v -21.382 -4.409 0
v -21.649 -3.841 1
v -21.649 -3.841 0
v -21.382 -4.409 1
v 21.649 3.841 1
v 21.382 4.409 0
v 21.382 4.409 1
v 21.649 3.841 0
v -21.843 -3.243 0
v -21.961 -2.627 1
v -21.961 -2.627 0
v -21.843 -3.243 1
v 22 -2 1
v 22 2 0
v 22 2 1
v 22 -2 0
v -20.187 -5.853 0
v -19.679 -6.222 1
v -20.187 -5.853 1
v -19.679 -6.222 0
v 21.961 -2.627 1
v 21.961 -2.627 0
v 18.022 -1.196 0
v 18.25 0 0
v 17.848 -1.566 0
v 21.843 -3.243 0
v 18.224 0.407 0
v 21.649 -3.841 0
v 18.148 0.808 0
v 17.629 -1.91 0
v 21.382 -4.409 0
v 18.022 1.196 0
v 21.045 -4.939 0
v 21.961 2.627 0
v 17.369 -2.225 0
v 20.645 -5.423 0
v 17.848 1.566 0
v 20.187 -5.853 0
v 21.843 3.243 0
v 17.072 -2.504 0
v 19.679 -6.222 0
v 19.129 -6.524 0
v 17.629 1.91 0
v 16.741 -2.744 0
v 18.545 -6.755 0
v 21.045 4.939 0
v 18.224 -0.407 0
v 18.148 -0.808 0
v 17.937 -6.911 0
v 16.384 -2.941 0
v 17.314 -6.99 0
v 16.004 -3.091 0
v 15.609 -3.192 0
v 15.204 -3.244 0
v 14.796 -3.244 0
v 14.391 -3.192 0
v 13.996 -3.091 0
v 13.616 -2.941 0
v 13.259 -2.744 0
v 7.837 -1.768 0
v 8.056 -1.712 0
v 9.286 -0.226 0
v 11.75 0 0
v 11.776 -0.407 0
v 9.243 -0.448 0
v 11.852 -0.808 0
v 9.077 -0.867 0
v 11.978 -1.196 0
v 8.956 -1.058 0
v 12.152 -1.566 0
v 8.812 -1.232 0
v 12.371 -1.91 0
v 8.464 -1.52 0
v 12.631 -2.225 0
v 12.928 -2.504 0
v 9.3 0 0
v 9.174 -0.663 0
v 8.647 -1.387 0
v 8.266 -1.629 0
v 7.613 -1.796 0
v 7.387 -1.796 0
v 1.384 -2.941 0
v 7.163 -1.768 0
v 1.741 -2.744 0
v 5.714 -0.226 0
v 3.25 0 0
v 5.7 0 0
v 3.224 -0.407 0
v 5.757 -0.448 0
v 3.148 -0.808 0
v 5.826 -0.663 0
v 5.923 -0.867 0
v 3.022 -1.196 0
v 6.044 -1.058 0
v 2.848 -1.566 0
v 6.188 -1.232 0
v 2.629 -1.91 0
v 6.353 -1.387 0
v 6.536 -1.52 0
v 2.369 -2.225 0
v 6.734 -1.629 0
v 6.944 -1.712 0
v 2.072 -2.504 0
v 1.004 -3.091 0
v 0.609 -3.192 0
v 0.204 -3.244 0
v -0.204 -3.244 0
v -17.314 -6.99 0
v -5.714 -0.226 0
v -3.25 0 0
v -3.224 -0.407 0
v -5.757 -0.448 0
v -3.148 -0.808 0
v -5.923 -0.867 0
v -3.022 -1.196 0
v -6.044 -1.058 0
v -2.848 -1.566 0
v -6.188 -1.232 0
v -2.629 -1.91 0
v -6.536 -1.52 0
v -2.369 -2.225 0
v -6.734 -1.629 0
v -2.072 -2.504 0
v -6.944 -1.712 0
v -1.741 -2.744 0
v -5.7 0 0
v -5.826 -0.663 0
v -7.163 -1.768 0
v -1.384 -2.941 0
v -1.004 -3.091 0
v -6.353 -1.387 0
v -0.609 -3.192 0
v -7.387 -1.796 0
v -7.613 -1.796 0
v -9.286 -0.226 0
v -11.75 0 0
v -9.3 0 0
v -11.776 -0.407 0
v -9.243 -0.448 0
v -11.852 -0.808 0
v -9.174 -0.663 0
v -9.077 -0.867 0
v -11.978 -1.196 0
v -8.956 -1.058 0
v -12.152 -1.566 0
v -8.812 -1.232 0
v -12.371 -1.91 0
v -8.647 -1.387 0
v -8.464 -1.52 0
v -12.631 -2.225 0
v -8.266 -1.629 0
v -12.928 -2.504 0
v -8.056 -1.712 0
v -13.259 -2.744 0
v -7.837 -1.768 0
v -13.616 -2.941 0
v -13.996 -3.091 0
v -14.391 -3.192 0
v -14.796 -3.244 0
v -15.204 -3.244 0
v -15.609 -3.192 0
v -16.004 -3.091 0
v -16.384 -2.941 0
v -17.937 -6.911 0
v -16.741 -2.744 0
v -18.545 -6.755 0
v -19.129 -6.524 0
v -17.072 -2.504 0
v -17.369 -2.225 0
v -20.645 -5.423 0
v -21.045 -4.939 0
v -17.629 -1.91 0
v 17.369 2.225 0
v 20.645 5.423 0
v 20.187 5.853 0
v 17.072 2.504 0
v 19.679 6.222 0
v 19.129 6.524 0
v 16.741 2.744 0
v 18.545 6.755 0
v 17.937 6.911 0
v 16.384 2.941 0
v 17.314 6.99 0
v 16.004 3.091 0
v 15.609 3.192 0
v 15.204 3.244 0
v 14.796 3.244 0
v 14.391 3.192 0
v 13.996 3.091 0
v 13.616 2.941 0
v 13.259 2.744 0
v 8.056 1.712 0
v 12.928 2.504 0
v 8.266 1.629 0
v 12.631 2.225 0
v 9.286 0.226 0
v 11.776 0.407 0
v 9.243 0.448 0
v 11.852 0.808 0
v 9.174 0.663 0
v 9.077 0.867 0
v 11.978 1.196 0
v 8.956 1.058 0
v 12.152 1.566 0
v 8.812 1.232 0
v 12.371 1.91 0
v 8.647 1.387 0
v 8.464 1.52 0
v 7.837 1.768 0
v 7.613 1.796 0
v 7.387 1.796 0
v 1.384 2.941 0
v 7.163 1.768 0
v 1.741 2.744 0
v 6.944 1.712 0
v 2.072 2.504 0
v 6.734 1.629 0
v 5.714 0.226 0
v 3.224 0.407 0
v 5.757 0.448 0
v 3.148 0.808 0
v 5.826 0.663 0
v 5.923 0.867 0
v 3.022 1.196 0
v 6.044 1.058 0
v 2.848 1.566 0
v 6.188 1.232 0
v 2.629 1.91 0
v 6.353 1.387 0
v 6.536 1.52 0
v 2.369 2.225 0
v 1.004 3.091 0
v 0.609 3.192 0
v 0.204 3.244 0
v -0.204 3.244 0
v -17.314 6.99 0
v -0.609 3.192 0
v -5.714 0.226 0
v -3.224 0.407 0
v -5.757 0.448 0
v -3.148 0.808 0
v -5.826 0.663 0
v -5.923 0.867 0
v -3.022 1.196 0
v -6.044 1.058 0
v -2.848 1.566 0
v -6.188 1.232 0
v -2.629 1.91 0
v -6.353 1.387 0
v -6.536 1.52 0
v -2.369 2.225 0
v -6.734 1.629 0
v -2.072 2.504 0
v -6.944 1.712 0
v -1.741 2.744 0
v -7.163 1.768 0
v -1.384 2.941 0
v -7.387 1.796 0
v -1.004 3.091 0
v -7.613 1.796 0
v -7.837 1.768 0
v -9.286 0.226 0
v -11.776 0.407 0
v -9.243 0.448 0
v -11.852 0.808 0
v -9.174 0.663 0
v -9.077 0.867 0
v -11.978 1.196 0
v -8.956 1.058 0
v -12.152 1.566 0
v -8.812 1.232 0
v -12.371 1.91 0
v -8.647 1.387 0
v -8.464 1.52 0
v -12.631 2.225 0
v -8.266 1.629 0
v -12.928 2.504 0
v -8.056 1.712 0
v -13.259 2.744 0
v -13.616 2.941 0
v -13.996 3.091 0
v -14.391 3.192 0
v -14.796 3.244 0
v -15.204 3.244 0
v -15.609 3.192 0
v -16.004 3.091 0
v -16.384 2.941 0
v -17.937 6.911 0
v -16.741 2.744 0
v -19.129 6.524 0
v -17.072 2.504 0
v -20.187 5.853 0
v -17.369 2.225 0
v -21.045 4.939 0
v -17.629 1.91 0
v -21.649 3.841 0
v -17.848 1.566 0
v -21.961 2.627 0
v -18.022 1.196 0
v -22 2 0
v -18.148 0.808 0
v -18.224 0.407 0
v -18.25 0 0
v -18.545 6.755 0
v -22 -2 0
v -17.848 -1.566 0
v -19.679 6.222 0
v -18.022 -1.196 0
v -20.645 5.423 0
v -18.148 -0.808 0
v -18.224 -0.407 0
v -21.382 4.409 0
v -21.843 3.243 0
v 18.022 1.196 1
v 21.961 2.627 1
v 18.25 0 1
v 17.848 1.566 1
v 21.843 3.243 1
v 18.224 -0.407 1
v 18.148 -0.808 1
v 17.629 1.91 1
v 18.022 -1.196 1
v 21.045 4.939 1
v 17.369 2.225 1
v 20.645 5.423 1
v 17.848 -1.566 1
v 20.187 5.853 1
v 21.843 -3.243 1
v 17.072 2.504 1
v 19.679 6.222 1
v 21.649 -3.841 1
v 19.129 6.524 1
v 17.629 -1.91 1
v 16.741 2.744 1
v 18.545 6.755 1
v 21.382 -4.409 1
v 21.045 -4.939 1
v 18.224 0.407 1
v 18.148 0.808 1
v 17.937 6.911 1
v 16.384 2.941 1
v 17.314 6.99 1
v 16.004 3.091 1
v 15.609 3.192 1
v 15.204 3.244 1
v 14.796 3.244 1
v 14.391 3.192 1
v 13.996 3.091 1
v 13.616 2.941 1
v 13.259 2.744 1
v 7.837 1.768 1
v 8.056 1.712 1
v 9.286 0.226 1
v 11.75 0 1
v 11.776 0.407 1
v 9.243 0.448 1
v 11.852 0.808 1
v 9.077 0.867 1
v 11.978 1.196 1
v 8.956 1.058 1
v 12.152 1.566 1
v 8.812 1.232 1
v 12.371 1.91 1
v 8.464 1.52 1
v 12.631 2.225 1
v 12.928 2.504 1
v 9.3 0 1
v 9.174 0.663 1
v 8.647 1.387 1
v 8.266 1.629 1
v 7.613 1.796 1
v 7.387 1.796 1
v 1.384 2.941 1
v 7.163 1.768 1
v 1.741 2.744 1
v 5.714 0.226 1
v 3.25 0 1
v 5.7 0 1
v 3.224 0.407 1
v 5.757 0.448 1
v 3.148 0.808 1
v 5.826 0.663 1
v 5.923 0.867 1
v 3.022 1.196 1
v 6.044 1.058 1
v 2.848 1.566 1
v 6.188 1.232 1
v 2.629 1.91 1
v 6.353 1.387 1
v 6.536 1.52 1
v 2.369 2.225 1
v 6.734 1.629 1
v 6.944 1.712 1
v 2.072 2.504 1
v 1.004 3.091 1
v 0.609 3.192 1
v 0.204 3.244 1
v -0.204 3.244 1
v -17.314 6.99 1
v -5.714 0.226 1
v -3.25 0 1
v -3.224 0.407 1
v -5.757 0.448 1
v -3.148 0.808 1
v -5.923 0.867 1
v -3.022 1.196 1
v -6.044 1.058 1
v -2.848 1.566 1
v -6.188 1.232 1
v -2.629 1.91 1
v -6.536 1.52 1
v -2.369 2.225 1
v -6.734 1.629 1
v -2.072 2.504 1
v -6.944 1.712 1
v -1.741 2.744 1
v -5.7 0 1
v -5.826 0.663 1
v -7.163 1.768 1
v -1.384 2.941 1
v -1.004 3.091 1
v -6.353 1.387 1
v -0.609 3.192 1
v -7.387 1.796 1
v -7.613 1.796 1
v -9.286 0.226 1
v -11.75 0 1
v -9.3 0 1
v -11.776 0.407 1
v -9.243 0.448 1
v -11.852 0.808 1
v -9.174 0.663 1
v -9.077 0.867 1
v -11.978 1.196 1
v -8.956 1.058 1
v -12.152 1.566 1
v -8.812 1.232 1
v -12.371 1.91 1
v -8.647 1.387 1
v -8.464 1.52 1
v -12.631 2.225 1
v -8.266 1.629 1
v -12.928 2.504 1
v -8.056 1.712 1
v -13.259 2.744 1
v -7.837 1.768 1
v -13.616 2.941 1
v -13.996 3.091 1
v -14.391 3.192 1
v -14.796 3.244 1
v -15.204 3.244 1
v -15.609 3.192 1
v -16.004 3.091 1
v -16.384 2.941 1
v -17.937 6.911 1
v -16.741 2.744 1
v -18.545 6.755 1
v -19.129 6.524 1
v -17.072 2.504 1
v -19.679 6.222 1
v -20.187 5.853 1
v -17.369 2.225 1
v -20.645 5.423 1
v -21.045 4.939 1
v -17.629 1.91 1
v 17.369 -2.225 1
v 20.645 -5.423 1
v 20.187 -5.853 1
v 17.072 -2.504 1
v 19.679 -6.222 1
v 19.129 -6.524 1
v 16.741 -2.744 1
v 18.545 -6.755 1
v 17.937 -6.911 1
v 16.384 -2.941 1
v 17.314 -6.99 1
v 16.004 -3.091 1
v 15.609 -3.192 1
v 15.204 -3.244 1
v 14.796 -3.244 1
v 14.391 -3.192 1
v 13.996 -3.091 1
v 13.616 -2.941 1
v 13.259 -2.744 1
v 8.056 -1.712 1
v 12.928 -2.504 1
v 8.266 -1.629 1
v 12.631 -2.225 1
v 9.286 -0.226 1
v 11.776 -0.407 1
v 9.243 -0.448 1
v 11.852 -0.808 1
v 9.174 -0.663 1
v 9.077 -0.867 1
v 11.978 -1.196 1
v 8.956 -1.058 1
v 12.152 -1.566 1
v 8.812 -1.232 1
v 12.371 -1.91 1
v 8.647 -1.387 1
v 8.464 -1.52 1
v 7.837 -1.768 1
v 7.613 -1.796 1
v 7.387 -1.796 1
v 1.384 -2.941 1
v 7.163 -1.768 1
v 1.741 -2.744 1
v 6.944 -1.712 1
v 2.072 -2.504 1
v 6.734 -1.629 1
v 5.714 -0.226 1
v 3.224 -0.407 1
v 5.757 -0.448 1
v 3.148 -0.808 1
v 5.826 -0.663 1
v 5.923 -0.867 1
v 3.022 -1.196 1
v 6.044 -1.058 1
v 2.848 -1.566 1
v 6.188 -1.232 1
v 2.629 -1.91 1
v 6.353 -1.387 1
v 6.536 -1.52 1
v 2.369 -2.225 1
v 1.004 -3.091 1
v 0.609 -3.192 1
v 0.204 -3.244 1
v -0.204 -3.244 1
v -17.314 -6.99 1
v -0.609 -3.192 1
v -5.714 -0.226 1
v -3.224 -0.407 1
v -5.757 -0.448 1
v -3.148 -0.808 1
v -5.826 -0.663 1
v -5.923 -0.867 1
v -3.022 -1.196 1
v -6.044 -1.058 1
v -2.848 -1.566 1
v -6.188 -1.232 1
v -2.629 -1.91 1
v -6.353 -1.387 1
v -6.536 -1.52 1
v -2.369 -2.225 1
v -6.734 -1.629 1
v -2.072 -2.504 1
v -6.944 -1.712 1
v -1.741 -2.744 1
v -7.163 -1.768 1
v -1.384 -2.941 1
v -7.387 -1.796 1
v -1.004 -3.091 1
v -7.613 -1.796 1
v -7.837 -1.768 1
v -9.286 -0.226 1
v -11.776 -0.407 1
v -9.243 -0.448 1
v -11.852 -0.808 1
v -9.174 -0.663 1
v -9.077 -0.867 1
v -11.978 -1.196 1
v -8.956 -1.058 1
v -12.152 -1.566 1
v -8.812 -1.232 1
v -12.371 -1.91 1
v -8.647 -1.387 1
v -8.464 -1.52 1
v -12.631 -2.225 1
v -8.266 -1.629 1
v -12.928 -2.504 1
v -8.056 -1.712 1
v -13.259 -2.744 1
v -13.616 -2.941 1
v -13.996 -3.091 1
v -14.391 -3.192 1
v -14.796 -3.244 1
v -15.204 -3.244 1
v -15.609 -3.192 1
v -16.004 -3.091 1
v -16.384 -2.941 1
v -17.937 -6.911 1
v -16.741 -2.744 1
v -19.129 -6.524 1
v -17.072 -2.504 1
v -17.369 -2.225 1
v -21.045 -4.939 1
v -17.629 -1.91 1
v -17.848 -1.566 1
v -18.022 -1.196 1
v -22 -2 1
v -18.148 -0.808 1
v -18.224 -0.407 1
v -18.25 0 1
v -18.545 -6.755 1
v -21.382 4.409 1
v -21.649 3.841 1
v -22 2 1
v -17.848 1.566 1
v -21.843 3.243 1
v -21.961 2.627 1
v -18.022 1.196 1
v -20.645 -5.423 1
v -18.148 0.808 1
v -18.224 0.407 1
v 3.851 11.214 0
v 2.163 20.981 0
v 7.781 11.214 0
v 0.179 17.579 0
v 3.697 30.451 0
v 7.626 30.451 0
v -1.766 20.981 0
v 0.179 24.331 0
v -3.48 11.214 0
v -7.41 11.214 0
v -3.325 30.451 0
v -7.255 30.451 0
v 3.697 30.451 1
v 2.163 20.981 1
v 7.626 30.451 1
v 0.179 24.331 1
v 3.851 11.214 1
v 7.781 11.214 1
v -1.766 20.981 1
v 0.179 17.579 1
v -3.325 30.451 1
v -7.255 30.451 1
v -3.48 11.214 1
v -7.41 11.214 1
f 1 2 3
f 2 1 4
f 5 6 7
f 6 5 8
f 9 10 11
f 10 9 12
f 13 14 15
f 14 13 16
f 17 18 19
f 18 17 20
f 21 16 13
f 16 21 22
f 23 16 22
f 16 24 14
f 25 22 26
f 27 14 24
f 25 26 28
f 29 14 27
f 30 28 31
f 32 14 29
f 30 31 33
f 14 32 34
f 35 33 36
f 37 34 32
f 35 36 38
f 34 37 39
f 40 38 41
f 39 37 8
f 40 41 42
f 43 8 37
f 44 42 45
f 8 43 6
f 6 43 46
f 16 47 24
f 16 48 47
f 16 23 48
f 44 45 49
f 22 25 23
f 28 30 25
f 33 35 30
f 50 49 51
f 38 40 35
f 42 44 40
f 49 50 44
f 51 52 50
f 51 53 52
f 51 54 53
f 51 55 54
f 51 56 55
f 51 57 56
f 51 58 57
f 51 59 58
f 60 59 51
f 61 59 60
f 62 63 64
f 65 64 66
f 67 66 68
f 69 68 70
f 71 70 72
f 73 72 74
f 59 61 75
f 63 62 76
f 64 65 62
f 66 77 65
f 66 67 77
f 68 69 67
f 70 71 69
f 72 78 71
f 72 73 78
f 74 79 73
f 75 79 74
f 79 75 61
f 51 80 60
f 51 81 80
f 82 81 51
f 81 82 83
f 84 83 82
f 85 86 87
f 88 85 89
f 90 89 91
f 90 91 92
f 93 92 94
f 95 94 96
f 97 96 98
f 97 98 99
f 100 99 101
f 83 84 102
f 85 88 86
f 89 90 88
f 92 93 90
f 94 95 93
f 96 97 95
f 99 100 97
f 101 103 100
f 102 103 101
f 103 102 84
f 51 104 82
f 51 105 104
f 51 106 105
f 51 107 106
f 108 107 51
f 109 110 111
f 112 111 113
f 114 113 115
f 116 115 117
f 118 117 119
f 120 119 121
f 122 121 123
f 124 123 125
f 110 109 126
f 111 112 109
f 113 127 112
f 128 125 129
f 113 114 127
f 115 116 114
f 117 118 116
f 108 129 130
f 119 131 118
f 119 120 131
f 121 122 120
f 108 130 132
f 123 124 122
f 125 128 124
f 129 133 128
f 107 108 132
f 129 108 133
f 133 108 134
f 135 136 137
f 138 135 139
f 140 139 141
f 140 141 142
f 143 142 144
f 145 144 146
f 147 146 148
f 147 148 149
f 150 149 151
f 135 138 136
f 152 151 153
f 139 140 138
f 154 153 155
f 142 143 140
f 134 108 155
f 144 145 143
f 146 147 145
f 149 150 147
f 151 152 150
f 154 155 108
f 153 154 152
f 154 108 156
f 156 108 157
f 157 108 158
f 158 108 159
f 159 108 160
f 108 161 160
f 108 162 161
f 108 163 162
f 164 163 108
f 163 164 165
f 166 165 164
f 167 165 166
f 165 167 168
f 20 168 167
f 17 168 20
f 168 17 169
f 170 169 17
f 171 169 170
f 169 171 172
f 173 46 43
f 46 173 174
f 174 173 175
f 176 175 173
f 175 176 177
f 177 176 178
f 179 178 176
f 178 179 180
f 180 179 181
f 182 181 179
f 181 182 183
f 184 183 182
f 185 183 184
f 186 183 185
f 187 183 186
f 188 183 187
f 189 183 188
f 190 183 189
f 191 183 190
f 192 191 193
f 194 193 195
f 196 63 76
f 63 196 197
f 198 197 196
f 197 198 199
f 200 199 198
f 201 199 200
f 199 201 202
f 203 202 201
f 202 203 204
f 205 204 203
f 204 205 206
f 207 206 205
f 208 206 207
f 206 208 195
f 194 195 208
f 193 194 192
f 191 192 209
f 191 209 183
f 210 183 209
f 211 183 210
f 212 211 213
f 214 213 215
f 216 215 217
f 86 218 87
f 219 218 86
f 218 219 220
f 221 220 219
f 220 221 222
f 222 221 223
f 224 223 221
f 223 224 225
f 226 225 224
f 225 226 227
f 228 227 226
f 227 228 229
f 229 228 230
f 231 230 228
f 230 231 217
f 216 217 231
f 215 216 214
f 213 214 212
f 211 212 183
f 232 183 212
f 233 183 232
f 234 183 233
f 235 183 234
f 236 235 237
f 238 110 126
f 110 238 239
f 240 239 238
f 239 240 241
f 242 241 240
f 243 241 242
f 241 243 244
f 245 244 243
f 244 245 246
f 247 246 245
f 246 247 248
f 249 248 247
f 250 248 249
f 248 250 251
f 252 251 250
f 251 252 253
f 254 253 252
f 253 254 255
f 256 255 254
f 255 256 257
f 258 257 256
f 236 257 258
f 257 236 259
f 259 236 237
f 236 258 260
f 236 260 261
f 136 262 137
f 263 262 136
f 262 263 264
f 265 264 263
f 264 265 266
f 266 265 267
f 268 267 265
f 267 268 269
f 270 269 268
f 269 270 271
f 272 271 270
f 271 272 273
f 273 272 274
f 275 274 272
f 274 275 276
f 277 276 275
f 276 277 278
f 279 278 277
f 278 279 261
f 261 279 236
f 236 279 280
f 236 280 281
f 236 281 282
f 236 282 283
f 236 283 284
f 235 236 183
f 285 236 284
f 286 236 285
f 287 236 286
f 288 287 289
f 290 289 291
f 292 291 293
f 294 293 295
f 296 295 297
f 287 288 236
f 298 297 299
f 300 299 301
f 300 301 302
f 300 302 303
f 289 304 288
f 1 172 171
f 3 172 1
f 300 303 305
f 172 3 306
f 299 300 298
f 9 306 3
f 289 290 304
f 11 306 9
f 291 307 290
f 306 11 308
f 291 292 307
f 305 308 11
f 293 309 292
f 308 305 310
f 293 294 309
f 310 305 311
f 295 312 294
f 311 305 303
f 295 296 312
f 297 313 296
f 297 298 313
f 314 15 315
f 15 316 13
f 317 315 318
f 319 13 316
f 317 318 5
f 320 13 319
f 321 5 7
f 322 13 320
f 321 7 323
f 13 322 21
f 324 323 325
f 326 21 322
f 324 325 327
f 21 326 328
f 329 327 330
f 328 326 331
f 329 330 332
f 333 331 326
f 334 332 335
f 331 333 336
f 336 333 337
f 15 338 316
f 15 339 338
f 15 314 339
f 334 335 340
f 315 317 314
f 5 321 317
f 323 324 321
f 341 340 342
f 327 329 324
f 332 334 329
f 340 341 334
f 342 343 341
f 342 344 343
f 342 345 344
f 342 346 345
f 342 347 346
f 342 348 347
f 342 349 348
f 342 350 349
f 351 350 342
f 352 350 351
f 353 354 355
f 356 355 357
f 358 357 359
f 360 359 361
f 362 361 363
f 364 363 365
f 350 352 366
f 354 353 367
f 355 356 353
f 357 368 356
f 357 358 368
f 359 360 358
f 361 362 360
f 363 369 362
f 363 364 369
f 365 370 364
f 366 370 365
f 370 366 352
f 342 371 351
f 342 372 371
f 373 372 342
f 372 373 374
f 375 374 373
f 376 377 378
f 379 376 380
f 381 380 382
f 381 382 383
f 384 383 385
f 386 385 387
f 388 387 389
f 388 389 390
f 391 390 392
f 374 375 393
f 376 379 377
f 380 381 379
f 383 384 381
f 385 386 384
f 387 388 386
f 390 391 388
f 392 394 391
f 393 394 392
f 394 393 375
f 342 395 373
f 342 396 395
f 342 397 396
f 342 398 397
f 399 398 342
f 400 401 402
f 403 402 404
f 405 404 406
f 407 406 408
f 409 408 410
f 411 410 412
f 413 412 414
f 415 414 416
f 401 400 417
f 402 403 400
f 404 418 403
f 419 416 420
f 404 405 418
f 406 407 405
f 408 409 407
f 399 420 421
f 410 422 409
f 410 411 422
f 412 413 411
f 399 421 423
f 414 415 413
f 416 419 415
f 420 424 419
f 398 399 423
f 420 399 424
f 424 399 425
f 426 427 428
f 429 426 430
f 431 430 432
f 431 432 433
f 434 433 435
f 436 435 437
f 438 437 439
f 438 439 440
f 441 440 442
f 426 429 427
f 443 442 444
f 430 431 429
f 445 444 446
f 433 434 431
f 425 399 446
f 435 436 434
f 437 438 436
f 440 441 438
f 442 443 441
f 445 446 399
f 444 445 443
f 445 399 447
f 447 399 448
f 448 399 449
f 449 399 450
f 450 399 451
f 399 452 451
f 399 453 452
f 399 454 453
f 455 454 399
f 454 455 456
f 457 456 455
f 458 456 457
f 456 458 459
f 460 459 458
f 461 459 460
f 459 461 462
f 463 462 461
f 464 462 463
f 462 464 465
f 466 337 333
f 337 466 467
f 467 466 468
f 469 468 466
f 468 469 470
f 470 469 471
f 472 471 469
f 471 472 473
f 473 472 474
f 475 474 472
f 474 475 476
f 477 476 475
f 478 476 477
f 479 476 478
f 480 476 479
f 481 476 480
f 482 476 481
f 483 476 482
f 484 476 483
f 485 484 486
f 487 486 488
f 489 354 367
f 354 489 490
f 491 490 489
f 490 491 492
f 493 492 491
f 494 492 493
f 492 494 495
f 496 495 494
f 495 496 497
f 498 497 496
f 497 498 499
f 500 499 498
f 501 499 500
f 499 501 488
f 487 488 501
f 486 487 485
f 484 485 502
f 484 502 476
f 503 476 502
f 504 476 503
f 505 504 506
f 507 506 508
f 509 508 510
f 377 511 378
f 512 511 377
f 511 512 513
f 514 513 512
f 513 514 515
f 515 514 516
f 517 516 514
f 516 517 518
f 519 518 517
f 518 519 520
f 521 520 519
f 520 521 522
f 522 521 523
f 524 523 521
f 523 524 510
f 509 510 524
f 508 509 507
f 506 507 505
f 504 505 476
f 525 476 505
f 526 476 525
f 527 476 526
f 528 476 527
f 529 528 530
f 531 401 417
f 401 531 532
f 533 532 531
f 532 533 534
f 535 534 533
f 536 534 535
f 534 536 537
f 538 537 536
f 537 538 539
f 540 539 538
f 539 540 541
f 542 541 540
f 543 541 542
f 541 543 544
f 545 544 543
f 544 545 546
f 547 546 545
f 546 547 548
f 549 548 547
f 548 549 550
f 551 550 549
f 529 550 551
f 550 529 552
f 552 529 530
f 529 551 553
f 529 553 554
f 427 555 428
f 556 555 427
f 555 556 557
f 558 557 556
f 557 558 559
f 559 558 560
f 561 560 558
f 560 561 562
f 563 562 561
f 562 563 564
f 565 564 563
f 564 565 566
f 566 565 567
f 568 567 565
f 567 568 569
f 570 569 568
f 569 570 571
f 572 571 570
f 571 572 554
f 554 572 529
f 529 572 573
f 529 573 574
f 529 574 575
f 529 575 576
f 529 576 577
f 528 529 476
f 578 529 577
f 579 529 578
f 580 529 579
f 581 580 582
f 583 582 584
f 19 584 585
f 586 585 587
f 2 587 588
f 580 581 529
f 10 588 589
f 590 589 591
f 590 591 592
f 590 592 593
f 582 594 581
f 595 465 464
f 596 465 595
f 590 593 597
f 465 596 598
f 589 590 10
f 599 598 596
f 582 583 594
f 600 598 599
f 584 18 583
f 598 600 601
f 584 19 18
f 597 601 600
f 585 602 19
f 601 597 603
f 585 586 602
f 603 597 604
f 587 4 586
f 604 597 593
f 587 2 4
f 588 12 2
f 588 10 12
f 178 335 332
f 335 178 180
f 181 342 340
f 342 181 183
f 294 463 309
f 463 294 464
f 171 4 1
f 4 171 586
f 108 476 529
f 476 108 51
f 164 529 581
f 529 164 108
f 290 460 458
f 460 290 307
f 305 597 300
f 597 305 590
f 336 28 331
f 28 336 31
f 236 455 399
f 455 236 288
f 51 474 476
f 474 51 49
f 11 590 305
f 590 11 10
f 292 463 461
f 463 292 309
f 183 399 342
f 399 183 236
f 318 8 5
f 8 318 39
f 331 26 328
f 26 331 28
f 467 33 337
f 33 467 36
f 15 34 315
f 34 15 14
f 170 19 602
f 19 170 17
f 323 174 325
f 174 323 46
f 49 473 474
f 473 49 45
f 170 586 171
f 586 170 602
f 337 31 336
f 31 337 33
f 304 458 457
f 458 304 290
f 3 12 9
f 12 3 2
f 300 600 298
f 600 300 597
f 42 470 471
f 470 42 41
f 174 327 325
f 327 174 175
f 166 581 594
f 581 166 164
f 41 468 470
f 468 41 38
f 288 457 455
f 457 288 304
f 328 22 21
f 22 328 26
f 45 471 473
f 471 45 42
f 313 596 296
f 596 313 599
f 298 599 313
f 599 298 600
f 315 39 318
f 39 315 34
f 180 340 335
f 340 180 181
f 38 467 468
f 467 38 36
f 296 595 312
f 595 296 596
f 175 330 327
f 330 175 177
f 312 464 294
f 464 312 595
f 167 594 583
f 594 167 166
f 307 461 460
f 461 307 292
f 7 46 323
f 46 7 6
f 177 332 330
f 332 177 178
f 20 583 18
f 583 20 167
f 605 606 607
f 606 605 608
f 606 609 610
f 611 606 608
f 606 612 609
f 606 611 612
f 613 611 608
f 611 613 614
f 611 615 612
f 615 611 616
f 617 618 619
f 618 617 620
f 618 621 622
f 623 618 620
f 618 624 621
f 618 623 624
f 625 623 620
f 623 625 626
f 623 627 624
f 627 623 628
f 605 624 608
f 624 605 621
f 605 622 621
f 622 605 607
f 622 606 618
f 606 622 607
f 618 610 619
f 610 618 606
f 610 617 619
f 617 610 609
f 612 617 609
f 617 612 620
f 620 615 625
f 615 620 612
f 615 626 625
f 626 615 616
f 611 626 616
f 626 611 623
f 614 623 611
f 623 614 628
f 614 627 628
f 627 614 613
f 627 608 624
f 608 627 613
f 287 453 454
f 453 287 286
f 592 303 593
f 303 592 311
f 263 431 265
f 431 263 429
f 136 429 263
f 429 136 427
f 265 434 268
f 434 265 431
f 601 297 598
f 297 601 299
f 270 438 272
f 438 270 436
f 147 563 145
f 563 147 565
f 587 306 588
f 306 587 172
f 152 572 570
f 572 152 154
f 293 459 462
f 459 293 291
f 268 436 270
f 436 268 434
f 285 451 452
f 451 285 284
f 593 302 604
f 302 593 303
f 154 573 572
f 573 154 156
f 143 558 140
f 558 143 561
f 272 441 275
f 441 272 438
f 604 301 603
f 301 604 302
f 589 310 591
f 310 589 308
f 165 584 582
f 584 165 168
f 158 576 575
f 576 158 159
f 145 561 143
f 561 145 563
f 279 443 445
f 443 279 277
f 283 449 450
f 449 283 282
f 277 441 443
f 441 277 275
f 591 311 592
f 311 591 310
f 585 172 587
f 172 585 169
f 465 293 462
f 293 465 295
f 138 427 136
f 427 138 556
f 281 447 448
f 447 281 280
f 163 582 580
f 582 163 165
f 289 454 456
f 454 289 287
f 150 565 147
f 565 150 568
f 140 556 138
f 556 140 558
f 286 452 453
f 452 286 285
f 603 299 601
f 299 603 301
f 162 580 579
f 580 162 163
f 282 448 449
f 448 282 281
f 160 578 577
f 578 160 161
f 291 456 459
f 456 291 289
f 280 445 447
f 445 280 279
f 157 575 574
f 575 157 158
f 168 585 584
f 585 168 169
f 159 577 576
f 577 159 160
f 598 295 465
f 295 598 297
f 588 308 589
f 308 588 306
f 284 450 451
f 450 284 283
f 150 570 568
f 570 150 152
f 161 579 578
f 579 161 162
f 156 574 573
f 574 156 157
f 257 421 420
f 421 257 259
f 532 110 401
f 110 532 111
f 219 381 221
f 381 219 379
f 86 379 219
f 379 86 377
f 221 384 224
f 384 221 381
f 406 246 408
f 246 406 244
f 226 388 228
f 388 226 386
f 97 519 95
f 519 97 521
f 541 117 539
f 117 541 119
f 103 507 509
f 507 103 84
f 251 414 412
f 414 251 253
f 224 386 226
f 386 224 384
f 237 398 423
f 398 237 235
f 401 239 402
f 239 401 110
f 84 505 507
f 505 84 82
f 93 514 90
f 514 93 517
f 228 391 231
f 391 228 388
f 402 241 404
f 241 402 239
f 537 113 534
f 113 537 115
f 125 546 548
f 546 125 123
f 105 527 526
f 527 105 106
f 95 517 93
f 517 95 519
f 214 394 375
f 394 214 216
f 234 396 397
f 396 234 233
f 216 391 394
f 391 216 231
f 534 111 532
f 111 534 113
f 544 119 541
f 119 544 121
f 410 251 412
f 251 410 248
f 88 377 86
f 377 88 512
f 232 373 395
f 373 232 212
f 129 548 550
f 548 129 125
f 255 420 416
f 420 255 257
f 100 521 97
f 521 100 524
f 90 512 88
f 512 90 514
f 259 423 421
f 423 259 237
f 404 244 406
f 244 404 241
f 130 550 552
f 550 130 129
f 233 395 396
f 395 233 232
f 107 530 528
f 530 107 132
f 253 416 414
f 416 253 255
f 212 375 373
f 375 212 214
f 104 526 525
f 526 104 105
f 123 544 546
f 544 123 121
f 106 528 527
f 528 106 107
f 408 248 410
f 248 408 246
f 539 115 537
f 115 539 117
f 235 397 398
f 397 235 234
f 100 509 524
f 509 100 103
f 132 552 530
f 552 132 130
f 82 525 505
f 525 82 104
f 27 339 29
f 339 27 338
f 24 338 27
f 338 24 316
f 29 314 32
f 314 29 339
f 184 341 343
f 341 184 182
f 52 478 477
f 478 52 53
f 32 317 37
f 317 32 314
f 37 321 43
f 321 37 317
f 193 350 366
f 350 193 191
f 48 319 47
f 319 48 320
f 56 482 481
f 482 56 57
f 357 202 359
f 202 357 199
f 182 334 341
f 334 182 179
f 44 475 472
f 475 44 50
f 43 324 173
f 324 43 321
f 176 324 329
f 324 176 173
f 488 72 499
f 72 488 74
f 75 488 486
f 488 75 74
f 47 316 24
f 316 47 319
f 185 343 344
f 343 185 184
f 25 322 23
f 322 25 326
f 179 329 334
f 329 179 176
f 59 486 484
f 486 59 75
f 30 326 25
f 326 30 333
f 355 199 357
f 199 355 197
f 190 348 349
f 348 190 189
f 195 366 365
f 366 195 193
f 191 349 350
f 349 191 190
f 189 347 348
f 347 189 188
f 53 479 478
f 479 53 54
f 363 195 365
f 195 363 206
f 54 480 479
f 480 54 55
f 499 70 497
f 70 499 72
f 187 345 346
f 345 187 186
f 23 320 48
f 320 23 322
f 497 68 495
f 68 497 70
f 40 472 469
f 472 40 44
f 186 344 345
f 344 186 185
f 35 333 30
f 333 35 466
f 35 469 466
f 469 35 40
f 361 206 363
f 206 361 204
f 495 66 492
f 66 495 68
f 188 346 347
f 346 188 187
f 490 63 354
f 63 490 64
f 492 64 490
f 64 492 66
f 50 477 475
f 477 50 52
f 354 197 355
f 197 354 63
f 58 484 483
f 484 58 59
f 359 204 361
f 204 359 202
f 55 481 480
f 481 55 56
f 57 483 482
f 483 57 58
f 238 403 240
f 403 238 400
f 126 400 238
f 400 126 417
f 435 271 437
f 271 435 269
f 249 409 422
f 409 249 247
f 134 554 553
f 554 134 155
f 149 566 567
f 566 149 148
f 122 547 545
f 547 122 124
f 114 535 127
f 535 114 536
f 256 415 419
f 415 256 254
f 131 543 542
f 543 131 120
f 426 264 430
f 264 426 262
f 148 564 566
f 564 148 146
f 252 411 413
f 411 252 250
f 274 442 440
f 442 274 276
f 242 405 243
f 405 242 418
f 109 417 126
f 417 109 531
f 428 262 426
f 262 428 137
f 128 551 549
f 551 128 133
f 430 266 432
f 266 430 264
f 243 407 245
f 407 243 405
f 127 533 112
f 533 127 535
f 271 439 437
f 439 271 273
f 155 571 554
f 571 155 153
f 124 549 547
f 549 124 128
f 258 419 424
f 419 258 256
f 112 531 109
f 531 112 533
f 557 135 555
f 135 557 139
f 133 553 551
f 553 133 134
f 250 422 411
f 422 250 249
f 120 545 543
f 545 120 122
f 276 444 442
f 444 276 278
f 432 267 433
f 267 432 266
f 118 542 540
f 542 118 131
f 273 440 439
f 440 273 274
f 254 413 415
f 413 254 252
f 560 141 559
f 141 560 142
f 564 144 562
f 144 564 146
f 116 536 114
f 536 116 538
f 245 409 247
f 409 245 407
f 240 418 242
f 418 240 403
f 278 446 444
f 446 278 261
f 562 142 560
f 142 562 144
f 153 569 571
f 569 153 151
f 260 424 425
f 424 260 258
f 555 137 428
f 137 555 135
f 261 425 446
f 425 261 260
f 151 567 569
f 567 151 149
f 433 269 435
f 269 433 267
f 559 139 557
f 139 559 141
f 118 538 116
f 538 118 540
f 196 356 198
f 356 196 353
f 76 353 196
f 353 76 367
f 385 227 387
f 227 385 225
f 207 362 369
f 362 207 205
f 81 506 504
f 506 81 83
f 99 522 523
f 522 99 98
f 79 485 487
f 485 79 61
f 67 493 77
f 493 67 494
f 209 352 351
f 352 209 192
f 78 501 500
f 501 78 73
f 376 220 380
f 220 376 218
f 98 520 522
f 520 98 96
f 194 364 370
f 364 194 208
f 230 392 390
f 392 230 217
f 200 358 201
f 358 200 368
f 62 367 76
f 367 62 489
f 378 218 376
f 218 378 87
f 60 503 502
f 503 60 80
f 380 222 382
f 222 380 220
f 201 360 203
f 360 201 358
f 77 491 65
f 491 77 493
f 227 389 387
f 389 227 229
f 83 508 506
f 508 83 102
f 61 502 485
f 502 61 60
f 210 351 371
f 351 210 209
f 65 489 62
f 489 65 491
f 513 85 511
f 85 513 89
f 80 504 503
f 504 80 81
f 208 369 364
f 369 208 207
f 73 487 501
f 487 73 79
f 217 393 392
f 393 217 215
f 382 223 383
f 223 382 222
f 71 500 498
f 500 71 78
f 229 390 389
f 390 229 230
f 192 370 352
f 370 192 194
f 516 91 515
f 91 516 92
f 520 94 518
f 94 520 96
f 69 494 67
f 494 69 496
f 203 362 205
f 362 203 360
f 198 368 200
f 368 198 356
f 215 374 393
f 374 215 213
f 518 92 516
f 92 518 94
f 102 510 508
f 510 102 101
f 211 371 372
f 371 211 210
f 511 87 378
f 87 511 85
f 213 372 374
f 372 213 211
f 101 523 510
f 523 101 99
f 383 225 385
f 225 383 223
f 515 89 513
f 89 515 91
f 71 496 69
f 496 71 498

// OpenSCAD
$fn = 50;


difference() {
	union() {
		hull() {
			translate(v = [-17.0000000000, 2.0000000000, 0]) {
				cylinder(h = 1, r = 5);
			}
			translate(v = [17.0000000000, 2.0000000000, 0]) {
				cylinder(h = 1, r = 5);
			}
			translate(v = [-17.0000000000, -2.0000000000, 0]) {
				cylinder(h = 1, r = 5);
			}
			translate(v = [17.0000000000, -2.0000000000, 0]) {
				cylinder(h = 1, r = 5);
			}
		}
		translate(v = [0, 30.0000000000, 0]) {
			linear_extrude(height = 1) {
				text(font = "DejaVu Sans Mono:style=Bold", halign = "center", size = 19.0000000000, text = "X", valign = "top");
			}
		}
	}
	union() {
		translate(v = [-15.0000000000, 0.0000000000, 0]) {
			translate(v = [0, 0, -100]) {
				cylinder(h = 200, r = 3.2500000000);
			}
		}
		translate(v = [0, 0, -100]) {
			cylinder(h = 200, r = 3.2500000000);
		}
		translate(v = [15.0000000000, 0.0000000000, 0]) {
			translate(v = [0, 0, -100]) {
				cylinder(h = 200, r = 3.2500000000);
			}
		}
		translate(v = [-15.0000000000, 0.0000000000, 0]) {
			translate(v = [0, 0, -100]) {
				cylinder(h = 200, r = 1.8000000000);
			}
		}
		translate(v = [-7.5000000000, 0.0000000000, 0]) {
			translate(v = [0, 0, -100]) {
				cylinder(h = 200, r = 1.8000000000);
			}
		}
		translate(v = [0, 0, -100]) {
			cylinder(h = 200, r = 1.8000000000);
		}
		translate(v = [7.5000000000, 0.0000000000, 0]) {
			translate(v = [0, 0, -100]) {
				cylinder(h = 200, r = 1.8000000000);
			}
		}
		translate(v = [15.0000000000, 0.0000000000, 0]) {
			translate(v = [0, 0, -100]) {
				cylinder(h = 200, r = 1.8000000000);
			}
		}
	}
}
